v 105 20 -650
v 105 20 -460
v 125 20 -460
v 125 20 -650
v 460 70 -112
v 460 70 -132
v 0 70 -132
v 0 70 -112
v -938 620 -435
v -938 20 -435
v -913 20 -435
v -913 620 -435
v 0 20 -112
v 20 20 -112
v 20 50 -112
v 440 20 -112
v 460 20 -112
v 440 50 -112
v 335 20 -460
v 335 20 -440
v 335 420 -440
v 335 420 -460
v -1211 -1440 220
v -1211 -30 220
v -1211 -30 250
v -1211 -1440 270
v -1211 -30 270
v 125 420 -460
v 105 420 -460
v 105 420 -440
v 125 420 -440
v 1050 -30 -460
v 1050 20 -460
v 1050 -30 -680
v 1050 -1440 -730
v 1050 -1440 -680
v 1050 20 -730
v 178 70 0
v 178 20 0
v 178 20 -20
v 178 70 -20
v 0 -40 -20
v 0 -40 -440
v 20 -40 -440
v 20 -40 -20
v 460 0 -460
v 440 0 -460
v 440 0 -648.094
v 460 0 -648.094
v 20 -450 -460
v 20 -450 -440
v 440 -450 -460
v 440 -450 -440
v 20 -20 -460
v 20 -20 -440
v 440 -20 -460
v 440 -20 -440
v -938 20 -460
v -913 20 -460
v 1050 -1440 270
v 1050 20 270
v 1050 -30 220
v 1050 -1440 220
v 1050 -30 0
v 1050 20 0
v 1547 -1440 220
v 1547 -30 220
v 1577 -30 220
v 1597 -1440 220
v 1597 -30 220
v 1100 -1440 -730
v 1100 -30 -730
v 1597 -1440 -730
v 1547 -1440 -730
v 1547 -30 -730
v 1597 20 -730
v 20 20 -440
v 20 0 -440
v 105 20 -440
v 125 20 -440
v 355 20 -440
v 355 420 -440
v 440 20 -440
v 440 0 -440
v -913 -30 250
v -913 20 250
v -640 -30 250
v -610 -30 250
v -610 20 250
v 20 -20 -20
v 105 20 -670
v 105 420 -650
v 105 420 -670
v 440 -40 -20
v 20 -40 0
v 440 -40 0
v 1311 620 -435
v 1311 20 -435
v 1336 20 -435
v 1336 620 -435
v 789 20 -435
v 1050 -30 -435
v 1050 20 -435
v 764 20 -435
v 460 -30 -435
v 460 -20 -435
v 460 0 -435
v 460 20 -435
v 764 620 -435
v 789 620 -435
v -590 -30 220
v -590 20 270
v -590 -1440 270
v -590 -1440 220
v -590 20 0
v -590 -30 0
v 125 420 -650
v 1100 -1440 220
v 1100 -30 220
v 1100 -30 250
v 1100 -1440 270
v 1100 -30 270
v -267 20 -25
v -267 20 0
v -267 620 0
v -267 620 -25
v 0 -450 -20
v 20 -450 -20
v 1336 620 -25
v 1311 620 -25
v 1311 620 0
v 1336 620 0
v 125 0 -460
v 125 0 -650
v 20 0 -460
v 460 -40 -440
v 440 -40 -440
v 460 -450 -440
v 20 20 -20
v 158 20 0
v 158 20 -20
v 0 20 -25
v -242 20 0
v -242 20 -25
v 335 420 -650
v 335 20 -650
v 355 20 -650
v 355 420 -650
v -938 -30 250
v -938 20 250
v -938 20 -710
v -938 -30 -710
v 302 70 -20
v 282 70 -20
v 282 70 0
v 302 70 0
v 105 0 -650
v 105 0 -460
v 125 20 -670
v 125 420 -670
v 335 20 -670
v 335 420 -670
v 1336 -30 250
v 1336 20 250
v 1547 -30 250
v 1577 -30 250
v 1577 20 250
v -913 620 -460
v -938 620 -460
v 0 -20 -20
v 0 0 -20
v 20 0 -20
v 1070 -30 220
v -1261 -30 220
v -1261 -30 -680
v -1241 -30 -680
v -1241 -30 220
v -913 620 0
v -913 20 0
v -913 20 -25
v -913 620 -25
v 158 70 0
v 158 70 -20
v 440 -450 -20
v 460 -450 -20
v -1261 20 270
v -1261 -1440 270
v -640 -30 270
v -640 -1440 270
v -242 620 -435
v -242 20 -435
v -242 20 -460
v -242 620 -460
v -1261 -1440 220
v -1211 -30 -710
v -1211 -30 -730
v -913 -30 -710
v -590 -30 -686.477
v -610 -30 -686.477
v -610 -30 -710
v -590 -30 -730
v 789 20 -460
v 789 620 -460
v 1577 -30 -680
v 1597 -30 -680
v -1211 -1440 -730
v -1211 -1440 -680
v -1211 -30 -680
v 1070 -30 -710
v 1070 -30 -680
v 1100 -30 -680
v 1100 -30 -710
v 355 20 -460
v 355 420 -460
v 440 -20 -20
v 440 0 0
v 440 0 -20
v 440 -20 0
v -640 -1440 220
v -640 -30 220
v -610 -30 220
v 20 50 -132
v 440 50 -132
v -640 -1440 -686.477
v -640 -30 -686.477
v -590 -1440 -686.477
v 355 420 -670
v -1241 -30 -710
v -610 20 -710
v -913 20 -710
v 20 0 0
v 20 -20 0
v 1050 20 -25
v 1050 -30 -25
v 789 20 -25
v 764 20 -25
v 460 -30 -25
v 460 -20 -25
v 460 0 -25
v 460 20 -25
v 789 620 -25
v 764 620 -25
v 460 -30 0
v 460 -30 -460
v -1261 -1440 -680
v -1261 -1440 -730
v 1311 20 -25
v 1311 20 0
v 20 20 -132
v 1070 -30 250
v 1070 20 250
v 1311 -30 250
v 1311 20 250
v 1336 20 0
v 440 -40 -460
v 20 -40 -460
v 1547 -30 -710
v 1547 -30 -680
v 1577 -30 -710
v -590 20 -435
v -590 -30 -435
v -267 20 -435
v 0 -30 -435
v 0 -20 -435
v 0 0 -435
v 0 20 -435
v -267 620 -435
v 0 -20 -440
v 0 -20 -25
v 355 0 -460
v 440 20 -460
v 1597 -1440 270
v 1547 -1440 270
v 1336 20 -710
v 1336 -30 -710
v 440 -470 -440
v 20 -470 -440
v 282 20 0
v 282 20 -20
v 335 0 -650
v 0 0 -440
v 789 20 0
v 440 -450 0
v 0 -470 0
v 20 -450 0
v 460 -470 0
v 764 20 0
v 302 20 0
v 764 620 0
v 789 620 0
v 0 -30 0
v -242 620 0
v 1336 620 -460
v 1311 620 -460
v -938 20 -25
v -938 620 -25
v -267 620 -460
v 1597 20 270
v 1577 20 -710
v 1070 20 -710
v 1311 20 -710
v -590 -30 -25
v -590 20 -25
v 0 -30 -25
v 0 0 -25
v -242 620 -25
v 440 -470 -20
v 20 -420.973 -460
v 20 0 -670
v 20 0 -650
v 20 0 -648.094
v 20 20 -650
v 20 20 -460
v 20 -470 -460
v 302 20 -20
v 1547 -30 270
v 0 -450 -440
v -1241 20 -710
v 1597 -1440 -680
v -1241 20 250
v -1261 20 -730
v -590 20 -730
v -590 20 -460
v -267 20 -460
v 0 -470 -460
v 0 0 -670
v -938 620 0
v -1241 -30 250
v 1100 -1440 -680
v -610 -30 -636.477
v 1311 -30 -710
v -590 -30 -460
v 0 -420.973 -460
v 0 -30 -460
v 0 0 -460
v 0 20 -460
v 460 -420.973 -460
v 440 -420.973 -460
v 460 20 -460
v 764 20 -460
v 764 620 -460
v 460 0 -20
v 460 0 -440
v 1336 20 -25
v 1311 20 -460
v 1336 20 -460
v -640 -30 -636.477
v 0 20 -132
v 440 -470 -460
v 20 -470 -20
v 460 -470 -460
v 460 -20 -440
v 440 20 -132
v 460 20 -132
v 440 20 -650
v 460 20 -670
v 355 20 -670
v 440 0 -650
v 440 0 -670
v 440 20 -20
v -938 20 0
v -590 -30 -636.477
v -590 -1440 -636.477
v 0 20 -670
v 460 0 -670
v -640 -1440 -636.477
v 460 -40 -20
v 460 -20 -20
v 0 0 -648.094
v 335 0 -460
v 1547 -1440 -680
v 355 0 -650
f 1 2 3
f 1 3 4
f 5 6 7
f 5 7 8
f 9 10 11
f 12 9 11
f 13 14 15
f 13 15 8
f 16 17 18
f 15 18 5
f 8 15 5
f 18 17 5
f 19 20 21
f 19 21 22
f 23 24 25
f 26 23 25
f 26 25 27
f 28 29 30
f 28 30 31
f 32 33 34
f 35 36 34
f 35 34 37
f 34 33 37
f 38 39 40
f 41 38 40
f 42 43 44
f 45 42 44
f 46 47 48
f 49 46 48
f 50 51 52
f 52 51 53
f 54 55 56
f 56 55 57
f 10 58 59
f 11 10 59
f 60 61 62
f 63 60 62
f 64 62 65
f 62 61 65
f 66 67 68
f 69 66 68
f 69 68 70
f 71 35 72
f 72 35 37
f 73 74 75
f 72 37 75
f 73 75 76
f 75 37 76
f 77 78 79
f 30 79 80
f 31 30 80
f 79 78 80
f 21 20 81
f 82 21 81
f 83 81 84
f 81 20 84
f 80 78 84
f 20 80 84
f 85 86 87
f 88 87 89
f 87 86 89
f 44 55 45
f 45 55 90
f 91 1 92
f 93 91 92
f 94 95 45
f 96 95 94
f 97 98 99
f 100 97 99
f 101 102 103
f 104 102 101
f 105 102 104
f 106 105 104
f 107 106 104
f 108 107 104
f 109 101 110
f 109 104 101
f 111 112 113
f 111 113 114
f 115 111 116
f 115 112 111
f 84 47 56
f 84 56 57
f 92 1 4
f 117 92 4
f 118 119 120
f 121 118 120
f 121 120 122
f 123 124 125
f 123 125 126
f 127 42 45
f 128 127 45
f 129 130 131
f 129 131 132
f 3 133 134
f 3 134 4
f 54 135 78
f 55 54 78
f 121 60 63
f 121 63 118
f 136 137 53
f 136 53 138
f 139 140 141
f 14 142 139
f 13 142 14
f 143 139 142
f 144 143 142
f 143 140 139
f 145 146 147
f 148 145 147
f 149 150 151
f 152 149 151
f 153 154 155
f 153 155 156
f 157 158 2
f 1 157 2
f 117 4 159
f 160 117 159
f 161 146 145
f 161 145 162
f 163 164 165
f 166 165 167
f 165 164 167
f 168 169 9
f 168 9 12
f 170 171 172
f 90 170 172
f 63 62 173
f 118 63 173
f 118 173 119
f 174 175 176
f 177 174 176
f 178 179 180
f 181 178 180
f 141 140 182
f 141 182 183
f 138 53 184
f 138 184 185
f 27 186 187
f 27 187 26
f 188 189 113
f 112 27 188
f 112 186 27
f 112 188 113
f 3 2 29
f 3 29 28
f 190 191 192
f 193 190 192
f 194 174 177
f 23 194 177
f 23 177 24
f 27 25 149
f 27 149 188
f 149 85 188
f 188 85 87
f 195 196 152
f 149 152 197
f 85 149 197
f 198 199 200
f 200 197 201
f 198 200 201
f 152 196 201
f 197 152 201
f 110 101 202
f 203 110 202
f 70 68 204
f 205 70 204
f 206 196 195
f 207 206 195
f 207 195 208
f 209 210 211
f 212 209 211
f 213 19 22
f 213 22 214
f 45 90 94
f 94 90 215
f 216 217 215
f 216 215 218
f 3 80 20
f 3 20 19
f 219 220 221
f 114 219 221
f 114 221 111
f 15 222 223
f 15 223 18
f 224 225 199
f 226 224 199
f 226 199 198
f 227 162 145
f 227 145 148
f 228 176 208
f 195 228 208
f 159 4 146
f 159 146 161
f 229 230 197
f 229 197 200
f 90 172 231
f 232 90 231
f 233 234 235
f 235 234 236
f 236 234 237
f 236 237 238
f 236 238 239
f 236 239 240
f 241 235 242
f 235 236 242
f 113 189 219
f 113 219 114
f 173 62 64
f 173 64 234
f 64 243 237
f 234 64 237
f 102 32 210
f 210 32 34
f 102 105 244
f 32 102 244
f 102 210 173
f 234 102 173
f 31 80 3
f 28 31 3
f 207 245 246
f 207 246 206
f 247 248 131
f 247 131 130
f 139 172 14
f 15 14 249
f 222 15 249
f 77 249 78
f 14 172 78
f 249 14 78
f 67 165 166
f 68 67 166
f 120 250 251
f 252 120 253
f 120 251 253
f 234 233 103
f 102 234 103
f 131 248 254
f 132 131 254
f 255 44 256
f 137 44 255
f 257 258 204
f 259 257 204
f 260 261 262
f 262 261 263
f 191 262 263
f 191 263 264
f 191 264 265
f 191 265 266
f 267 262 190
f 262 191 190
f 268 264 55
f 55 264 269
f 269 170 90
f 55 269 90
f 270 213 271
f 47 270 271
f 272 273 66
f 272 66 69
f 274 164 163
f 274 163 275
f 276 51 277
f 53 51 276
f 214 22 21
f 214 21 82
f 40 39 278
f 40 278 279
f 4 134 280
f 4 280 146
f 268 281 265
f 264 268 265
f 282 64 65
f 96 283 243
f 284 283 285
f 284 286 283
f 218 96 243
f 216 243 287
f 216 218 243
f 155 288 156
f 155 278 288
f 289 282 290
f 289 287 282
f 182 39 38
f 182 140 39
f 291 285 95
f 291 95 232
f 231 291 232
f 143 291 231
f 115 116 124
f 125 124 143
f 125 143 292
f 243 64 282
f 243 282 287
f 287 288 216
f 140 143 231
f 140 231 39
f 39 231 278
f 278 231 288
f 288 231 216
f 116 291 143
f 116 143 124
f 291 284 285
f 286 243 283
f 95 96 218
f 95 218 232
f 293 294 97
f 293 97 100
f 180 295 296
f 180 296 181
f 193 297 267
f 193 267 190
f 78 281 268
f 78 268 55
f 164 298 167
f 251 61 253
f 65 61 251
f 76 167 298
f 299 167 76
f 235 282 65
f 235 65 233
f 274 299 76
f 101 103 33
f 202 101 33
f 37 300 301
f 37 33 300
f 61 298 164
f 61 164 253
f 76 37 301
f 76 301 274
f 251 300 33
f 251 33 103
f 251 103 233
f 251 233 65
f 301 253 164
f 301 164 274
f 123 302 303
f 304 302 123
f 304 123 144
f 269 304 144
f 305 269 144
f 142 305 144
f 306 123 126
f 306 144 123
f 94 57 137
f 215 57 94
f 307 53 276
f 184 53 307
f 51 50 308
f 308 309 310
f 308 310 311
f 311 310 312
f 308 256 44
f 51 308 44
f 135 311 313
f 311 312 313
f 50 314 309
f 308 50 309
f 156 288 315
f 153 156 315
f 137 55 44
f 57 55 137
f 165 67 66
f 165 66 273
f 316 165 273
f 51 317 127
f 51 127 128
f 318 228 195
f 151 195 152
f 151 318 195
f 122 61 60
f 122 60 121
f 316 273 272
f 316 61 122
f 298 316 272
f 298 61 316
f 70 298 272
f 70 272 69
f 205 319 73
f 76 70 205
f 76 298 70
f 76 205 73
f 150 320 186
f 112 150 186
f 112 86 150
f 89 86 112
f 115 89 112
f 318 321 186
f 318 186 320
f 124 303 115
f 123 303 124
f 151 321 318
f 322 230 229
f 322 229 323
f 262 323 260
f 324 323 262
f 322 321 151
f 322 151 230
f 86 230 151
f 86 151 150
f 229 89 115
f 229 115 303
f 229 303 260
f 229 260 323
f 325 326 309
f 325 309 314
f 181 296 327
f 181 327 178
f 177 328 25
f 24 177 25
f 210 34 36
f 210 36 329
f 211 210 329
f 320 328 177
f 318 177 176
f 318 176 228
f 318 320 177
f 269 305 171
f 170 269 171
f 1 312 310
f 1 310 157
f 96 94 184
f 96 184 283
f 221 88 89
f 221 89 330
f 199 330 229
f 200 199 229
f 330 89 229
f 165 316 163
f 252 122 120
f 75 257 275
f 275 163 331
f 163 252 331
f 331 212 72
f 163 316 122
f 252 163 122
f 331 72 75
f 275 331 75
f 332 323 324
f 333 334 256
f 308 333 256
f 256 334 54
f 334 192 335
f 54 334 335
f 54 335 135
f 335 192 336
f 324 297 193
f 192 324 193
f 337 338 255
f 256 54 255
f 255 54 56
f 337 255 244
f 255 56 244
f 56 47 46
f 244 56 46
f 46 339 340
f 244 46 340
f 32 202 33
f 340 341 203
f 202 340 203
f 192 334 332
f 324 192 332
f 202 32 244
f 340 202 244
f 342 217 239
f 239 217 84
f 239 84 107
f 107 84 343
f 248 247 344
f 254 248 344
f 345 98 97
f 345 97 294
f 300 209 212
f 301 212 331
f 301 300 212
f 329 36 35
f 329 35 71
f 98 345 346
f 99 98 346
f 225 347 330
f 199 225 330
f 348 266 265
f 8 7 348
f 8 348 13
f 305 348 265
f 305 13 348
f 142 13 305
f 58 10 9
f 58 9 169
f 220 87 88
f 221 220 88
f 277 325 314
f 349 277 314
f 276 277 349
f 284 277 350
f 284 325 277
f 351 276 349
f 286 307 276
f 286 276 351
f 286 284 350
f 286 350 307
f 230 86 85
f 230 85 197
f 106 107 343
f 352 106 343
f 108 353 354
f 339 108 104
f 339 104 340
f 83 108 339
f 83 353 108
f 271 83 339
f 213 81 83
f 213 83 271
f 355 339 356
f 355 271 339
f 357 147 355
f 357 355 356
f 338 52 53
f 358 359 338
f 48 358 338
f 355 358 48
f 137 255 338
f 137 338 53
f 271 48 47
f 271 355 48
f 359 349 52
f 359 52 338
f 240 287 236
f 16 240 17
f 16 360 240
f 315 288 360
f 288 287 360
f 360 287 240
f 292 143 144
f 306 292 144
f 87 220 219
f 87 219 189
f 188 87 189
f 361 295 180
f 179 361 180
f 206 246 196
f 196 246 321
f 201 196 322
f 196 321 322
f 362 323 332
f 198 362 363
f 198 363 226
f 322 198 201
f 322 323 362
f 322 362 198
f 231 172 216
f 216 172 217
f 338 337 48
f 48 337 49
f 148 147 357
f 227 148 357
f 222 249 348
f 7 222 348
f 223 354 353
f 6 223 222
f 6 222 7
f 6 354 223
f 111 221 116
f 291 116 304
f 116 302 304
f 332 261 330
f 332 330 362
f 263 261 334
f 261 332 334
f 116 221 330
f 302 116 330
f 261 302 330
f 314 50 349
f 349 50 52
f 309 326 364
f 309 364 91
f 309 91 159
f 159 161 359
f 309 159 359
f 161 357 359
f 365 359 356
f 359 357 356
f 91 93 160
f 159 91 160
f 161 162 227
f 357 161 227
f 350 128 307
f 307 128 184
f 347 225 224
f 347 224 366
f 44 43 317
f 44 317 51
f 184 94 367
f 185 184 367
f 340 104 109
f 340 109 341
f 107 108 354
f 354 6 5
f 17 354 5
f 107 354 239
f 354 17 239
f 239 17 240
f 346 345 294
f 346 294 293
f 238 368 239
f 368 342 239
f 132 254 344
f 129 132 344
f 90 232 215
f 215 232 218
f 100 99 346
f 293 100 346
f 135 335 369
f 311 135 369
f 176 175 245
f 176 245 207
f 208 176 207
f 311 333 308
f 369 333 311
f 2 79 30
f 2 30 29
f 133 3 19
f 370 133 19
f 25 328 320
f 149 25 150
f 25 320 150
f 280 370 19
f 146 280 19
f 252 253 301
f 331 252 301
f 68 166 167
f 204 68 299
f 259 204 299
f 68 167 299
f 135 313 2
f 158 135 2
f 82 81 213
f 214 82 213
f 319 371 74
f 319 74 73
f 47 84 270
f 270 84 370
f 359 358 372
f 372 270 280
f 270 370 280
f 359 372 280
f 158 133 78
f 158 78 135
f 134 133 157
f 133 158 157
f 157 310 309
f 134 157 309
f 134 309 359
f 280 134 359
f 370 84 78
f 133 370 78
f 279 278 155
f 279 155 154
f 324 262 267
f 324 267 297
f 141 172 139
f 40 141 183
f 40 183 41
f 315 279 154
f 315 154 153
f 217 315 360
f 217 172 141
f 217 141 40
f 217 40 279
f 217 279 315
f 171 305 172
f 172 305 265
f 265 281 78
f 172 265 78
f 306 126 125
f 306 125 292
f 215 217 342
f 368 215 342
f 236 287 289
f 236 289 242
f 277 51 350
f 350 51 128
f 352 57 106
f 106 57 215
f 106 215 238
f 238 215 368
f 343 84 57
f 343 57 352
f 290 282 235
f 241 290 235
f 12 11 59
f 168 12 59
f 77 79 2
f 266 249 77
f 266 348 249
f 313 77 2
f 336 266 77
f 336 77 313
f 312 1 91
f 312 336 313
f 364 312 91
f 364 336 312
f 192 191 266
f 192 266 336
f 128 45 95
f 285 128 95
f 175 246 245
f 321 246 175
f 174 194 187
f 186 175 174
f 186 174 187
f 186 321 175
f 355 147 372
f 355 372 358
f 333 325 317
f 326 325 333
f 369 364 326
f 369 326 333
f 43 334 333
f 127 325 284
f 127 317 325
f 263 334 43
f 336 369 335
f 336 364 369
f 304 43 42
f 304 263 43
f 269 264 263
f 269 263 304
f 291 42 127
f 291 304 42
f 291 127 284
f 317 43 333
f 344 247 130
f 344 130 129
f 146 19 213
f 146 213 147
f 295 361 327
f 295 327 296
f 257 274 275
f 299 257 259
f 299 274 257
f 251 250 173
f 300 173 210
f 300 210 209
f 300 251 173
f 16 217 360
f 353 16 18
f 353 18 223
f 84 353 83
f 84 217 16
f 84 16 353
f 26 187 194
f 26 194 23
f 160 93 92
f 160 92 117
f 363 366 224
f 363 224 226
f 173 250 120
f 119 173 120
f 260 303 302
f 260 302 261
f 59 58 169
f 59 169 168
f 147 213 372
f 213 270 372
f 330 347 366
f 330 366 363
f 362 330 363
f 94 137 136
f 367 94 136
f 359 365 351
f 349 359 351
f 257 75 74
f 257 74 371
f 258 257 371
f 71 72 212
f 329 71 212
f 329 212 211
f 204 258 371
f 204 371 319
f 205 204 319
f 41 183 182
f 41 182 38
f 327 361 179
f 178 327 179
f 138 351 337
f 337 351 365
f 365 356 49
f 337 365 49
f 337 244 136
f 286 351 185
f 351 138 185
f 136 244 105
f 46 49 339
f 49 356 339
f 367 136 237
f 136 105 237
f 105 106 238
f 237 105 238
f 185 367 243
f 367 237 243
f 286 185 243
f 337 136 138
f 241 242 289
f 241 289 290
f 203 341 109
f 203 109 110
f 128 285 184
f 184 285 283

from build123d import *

# Parameters (mm, degrees)
CROQUIS1_W               = 460
CROQUIS1_H               = 460
CROQUIS1_W_2             = 420
CROQUIS1_H_2             = 420
SALIENTE_EXTRUIR1_DEPTH  = 20
CROQUIS2_W               = 20
CROQUIS2_H               = 20
SALIENTE_EXTRUIR2_DEPTH  = 20
CROQUIS3_W               = 460
CROQUIS3_H               = 460
CROQUIS3_W_2             = 420
CROQUIS3_H_2             = 420
SALIENTE_EXTRUIR3_DEPTH  = 20
CROQUIS4_W               = 20
CROQUIS4_H               = 20
SALIENTE_EXTRUIR4_DEPTH  = 410
CROQUIS5_W               = 460
CROQUIS5_H               = 460
CROQUIS5_W_2             = 420
CROQUIS5_H_2             = 420
SALIENTE_EXTRUIR5_DEPTH  = 20
CROQUIS7_W               = 25
CROQUIS7_H               = 50
SALIENTE_EXTRUIR7_DEPTH  = 590
CROQUIS8_W               = 25
CROQUIS8_H               = 50
SALIENTE_EXTRUIR8_DEPTH  = 590
CROQUIS9_W               = 25
CROQUIS9_H               = 25
SALIENTE_EXTRUIR9_DEPTH  = 600
CROQUIS10_W              = 671
CROQUIS10_H              = 1000
CROQUIS10_W_2            = 303
CROQUIS10_H_2            = 960
CROQUIS10_W_3            = 547
CROQUIS10_W_4            = 241
SALIENTE_EXTRUIR10_DEPTH = 50
CROQUIS11_W              = 50
CROQUIS11_H              = 50
SALIENTE_EXTRUIR11_DEPTH = 1410
CROQUIS13_W              = 20
CROQUIS13_H              = 20
SALIENTE_EXTRUIR12_DEPTH = 210
CROQUIS14_W              = 20
CROQUIS14_H              = 20
SALIENTE_EXTRUIR13_DEPTH = 210
CROQUIS15_W              = 20
CROQUIS15_H              = 20
SALIENTE_EXTRUIR14_DEPTH = 50
CROQUIS16_W              = 20
CROQUIS16_H              = 20
SALIENTE_EXTRUIR15_DEPTH = 400
CROQUIS17_W              = 460
CROQUIS17_H              = 230
CROQUIS17_W_2            = 420
CROQUIS17_H_2            = 190
SALIENTE_EXTRUIR16_DEPTH = 20
SALIENTE_EXTRUIR17_DEPTH = 20
SALIENTE_EXTRUIR18_DEPTH = 20
CROQUIS23_W              = 20
CROQUIS23_H              = 20
SALIENTE_EXTRUIR22_DEPTH = 50
CROQUIS24_W              = 20
CROQUIS24_H              = 20
SALIENTE_EXTRUIR23_DEPTH = 420


with BuildPart() as part:
    # Croquis1 → Saliente-Extruir1 (new body)
    with BuildSketch(Plane(origin=(0, 0, 0), x_dir=(1, 0, 0), z_dir=(0, 1, 0))):
        with Locations((230, 230)):
            Rectangle(CROQUIS1_W, CROQUIS1_H)
        with Locations((230, 230)):
            Rectangle(CROQUIS1_W_2, CROQUIS1_H_2, mode=Mode.SUBTRACT)
    extrude(amount=SALIENTE_EXTRUIR1_DEPTH)

    # Croquis2 → Saliente-Extruir2 (add)
    with BuildSketch(Plane.XZ):
        with Locations((10, -10)):
            Rectangle(CROQUIS2_W, CROQUIS2_H)
        with Locations((10, -450)):
            Rectangle(CROQUIS2_W, CROQUIS2_H)
        with Locations((450, -450)):
            Rectangle(CROQUIS2_W, CROQUIS2_H)
        with Locations((450, -10)):
            Rectangle(CROQUIS2_W, CROQUIS2_H)
    extrude(amount=SALIENTE_EXTRUIR2_DEPTH)

    # Croquis3 → Saliente-Extruir3 (add)
    with BuildSketch(Plane.XZ.offset(20)):
        with Locations((230, -230)):
            Rectangle(CROQUIS3_W, CROQUIS3_H)
        with Locations((230, -230)):
            Rectangle(CROQUIS3_W_2, CROQUIS3_H_2, mode=Mode.SUBTRACT)
    extrude(amount=SALIENTE_EXTRUIR3_DEPTH)

    # Croquis4 → Saliente-Extruir4 (add)
    with BuildSketch(Plane.XZ.offset(40)):
        with Locations((10, -10)):
            Rectangle(CROQUIS4_W, CROQUIS4_H)
        with Locations((10, -450)):
            Rectangle(CROQUIS4_W, CROQUIS4_H)
        with Locations((450, -450)):
            Rectangle(CROQUIS4_W, CROQUIS4_H)
        with Locations((450, -10)):
            Rectangle(CROQUIS4_W, CROQUIS4_H)
    extrude(amount=SALIENTE_EXTRUIR4_DEPTH)

    # Croquis5 → Saliente-Extruir5 (add)
    with BuildSketch(Plane.XZ.offset(450)):
        with Locations((230, -230)):
            Rectangle(CROQUIS5_W, CROQUIS5_H)
        with Locations((230, -230)):
            Rectangle(CROQUIS5_W_2, CROQUIS5_H_2, mode=Mode.SUBTRACT)
    extrude(amount=SALIENTE_EXTRUIR5_DEPTH)

    # Croquis7 → Saliente-Extruir7 (add)
    with BuildSketch(Plane.ZY):
        with Locations((-12.5, -5)):
            Rectangle(CROQUIS7_W, CROQUIS7_H)
        with Locations((-447.5, -5)):
            Rectangle(CROQUIS7_W, CROQUIS7_H)
    extrude(amount=SALIENTE_EXTRUIR7_DEPTH)

    # Croquis8 → Saliente-Extruir8 (add)
    with BuildSketch(Plane(origin=(460, 0, 0), x_dir=(0, 0, -1), z_dir=(1, 0, 0))):
        with Locations((12.5, -5)):
            Rectangle(CROQUIS8_W, CROQUIS8_H)
        with Locations((447.5, -5)):
            Rectangle(CROQUIS8_W, CROQUIS8_H)
    extrude(amount=SALIENTE_EXTRUIR8_DEPTH)

    # Croquis9 → Saliente-Extruir9 (add)
    with BuildSketch(Plane(origin=(0, 20, 0), x_dir=(1, 0, 0), z_dir=(0, 1, 0))):
        with Locations((-254.5, 447.5)):
            Rectangle(CROQUIS9_W, CROQUIS9_H)
        with Locations((-254.5, 12.5)):
            Rectangle(CROQUIS9_W, CROQUIS9_H)
        with Locations((776.5, 447.5)):
            Rectangle(CROQUIS9_W, CROQUIS9_H)
        with Locations((776.5, 12.5)):
            Rectangle(CROQUIS9_W, CROQUIS9_H)
        with Locations((-925.5, 12.5)):
            Rectangle(CROQUIS9_W, CROQUIS9_H)
        with Locations((-925.5, 447.5)):
            Rectangle(CROQUIS9_W, CROQUIS9_H)
        with Locations((1323.5, 12.5)):
            Rectangle(CROQUIS9_W, CROQUIS9_H)
        with Locations((1323.5, 447.5)):
            Rectangle(CROQUIS9_W, CROQUIS9_H)
    extrude(amount=SALIENTE_EXTRUIR9_DEPTH)


with BuildPart() as saliente_extruir9_piece_1:
    # of the separate pieces the step leaves, piece 1, a body of its own (saliente_extruir9_pieces)
    add(part.part.solids().sort_by_distance((0, -30, 0))[0])

    # Croquis10 → Saliente-Extruir10 (add)
    # profile 1 of 2: a face of its own
    with BuildSketch(Plane(origin=(0, 20, 0), x_dir=(1, 0, 0), z_dir=(0, 1, 0))):
        with Locations((-925.5, 230)):
            Rectangle(CROQUIS10_W, CROQUIS10_H)
        with Locations((-761.5, 230)):
            Rectangle(CROQUIS10_W_2, CROQUIS10_H_2, mode=Mode.SUBTRACT)
        with Locations((-1089.5, 230)):
            Rectangle(CROQUIS10_W_2, CROQUIS10_H_2, mode=Mode.SUBTRACT)
    # profile 2 of 2: a face of its own
    with BuildSketch(Plane(origin=(0, 20, 0), x_dir=(1, 0, 0), z_dir=(0, 1, 0))):
        with Locations((1323.5, 230)):
            Rectangle(CROQUIS10_W_3, CROQUIS10_H)
        with Locations((1190.5, 230)):
            Rectangle(CROQUIS10_W_4, CROQUIS10_H_2, mode=Mode.SUBTRACT)
        with Locations((1456.5, 230)):
            Rectangle(CROQUIS10_W_4, CROQUIS10_H_2, mode=Mode.SUBTRACT)
    extrude(amount=-SALIENTE_EXTRUIR10_DEPTH)

    # Croquis11 → Saliente-Extruir11 (add)
    with BuildSketch(Plane.XZ.offset(30)):
        with Locations((-1236, 245)):
            Rectangle(CROQUIS11_W, CROQUIS11_H)
        with Locations((-615, 245)):
            Rectangle(CROQUIS11_W, CROQUIS11_H)
        with Locations((-615, -661.477179098)):
            Rectangle(CROQUIS11_W, CROQUIS11_H)
        with Locations((-1236, -705)):
            Rectangle(CROQUIS11_W, CROQUIS11_H)
        with Locations((1075, -705)):
            Rectangle(CROQUIS11_W, CROQUIS11_H)
        with Locations((1572, -705)):
            Rectangle(CROQUIS11_W, CROQUIS11_H)
        with Locations((1572, 245)):
            Rectangle(CROQUIS11_W, CROQUIS11_H)
        with Locations((1075, 245)):
            Rectangle(CROQUIS11_W, CROQUIS11_H)
    extrude(amount=SALIENTE_EXTRUIR11_DEPTH)

    # Croquis13 → Saliente-Extruir12 (add)
    with BuildSketch(Plane(origin=(0, 0, -460), x_dir=(-1, 0, 0), z_dir=(0, 0, -1))):
        with Locations((-345, 10)):
            Rectangle(CROQUIS13_W, CROQUIS13_H)
        with Locations((-115, 10)):
            Rectangle(CROQUIS13_W, CROQUIS13_H)
    extrude(amount=SALIENTE_EXTRUIR12_DEPTH)

    # Croquis14 → Saliente-Extruir13 (add)
    with BuildSketch(Plane(origin=(125, 0, 0), x_dir=(0, 0, -1), z_dir=(1, 0, 0))):
        with Locations((660, 10)):
            Rectangle(CROQUIS14_W, CROQUIS14_H)
    extrude(amount=SALIENTE_EXTRUIR13_DEPTH)

    # Croquis15 → Saliente-Extruir14 (add)
    with BuildSketch(Plane(origin=(0, 20, 0), x_dir=(1, 0, 0), z_dir=(0, 1, 0))):
        with Locations((292, 10)):
            Rectangle(CROQUIS15_W, CROQUIS15_H)
        with Locations((168, 10)):
            Rectangle(CROQUIS15_W, CROQUIS15_H)
    extrude(amount=SALIENTE_EXTRUIR14_DEPTH)

    # Croquis16 → Saliente-Extruir15 (add)
    with BuildSketch(Plane(origin=(0, 20, 0), x_dir=(1, 0, 0), z_dir=(0, 1, 0))):
        with Locations((345, 660)):
            Rectangle(CROQUIS16_W, CROQUIS16_H)
        with Locations((115, 660)):
            Rectangle(CROQUIS16_W, CROQUIS16_H)
        with Locations((345, 450)):
            Rectangle(CROQUIS16_W, CROQUIS16_H)
        with Locations((115, 450)):
            Rectangle(CROQUIS16_W, CROQUIS16_H)
    extrude(amount=SALIENTE_EXTRUIR15_DEPTH)

    # Croquis17 → Saliente-Extruir16 (add)
    with BuildSketch(Plane(origin=(0, 20, 0), x_dir=(1, 0, 0), z_dir=(0, 1, 0))):
        with Locations((230, 555)):
            Rectangle(CROQUIS17_W, CROQUIS17_H)
        with Locations((230, 555)):
            Rectangle(CROQUIS17_W_2, CROQUIS17_H_2, mode=Mode.SUBTRACT)
    extrude(amount=-SALIENTE_EXTRUIR16_DEPTH)

    # Croquis18 → Saliente-Extruir17 (add)
    with BuildSketch(Plane.ZY):
        Polygon((-670, 0), (-460, -470), (-441.739825788, -461.841198756), (-651.739825788, 8.158801244), align=None)
    extrude(amount=-SALIENTE_EXTRUIR17_DEPTH)

    # Croquis19 → Saliente-Extruir18 (add)
    with BuildSketch(Plane(origin=(460, 0, 0), x_dir=(0, 0, -1), z_dir=(1, 0, 0))):
        Polygon((670, 0), (460, -470), (441.739825788, -461.841198756), (651.739825788, 8.158801244), align=None)
    extrude(amount=-SALIENTE_EXTRUIR18_DEPTH)

    # Croquis23 → Saliente-Extruir22 (add)
    with BuildSketch(Plane(origin=(0, 20, 0), x_dir=(1, 0, 0), z_dir=(0, 1, 0))):
        with Locations((10, 122)):
            Rectangle(CROQUIS23_W, CROQUIS23_H)
        with Locations((450, 122)):
            Rectangle(CROQUIS23_W, CROQUIS23_H)
    extrude(amount=SALIENTE_EXTRUIR22_DEPTH)

    # Croquis24 → Saliente-Extruir23 (add)
    with BuildSketch(Plane.ZY.offset(-440)):
        with Locations((-122, 60)):
            Rectangle(CROQUIS24_W, CROQUIS24_H)
    extrude(amount=SALIENTE_EXTRUIR23_DEPTH)


with BuildPart() as saliente_extruir9_piece_2:
    # of the separate pieces the step leaves, piece 2, a body of its own (saliente_extruir9_pieces)
    add(part.part.solids().sort_by_distance((1311, 20, -460))[0])


with BuildPart() as saliente_extruir9_piece_3:
    # of the separate pieces the step leaves, piece 3, a body of its own (saliente_extruir9_pieces)
    add(part.part.solids().sort_by_distance((-913, 20, 0))[0])


with BuildPart() as saliente_extruir9_piece_4:
    # of the separate pieces the step leaves, piece 4, a body of its own (saliente_extruir9_pieces)
    add(part.part.solids().sort_by_distance((1311, 20, -25))[0])


with BuildPart() as saliente_extruir9_piece_5:
    # of the separate pieces the step leaves, piece 5, a body of its own (saliente_extruir9_pieces)
    add(part.part.solids().sort_by_distance((-938, 20, -460))[0])


solid = Compound([saliente_extruir9_piece_1.part, saliente_extruir9_piece_2.part, saliente_extruir9_piece_3.part, saliente_extruir9_piece_4.part, saliente_extruir9_piece_5.part])
